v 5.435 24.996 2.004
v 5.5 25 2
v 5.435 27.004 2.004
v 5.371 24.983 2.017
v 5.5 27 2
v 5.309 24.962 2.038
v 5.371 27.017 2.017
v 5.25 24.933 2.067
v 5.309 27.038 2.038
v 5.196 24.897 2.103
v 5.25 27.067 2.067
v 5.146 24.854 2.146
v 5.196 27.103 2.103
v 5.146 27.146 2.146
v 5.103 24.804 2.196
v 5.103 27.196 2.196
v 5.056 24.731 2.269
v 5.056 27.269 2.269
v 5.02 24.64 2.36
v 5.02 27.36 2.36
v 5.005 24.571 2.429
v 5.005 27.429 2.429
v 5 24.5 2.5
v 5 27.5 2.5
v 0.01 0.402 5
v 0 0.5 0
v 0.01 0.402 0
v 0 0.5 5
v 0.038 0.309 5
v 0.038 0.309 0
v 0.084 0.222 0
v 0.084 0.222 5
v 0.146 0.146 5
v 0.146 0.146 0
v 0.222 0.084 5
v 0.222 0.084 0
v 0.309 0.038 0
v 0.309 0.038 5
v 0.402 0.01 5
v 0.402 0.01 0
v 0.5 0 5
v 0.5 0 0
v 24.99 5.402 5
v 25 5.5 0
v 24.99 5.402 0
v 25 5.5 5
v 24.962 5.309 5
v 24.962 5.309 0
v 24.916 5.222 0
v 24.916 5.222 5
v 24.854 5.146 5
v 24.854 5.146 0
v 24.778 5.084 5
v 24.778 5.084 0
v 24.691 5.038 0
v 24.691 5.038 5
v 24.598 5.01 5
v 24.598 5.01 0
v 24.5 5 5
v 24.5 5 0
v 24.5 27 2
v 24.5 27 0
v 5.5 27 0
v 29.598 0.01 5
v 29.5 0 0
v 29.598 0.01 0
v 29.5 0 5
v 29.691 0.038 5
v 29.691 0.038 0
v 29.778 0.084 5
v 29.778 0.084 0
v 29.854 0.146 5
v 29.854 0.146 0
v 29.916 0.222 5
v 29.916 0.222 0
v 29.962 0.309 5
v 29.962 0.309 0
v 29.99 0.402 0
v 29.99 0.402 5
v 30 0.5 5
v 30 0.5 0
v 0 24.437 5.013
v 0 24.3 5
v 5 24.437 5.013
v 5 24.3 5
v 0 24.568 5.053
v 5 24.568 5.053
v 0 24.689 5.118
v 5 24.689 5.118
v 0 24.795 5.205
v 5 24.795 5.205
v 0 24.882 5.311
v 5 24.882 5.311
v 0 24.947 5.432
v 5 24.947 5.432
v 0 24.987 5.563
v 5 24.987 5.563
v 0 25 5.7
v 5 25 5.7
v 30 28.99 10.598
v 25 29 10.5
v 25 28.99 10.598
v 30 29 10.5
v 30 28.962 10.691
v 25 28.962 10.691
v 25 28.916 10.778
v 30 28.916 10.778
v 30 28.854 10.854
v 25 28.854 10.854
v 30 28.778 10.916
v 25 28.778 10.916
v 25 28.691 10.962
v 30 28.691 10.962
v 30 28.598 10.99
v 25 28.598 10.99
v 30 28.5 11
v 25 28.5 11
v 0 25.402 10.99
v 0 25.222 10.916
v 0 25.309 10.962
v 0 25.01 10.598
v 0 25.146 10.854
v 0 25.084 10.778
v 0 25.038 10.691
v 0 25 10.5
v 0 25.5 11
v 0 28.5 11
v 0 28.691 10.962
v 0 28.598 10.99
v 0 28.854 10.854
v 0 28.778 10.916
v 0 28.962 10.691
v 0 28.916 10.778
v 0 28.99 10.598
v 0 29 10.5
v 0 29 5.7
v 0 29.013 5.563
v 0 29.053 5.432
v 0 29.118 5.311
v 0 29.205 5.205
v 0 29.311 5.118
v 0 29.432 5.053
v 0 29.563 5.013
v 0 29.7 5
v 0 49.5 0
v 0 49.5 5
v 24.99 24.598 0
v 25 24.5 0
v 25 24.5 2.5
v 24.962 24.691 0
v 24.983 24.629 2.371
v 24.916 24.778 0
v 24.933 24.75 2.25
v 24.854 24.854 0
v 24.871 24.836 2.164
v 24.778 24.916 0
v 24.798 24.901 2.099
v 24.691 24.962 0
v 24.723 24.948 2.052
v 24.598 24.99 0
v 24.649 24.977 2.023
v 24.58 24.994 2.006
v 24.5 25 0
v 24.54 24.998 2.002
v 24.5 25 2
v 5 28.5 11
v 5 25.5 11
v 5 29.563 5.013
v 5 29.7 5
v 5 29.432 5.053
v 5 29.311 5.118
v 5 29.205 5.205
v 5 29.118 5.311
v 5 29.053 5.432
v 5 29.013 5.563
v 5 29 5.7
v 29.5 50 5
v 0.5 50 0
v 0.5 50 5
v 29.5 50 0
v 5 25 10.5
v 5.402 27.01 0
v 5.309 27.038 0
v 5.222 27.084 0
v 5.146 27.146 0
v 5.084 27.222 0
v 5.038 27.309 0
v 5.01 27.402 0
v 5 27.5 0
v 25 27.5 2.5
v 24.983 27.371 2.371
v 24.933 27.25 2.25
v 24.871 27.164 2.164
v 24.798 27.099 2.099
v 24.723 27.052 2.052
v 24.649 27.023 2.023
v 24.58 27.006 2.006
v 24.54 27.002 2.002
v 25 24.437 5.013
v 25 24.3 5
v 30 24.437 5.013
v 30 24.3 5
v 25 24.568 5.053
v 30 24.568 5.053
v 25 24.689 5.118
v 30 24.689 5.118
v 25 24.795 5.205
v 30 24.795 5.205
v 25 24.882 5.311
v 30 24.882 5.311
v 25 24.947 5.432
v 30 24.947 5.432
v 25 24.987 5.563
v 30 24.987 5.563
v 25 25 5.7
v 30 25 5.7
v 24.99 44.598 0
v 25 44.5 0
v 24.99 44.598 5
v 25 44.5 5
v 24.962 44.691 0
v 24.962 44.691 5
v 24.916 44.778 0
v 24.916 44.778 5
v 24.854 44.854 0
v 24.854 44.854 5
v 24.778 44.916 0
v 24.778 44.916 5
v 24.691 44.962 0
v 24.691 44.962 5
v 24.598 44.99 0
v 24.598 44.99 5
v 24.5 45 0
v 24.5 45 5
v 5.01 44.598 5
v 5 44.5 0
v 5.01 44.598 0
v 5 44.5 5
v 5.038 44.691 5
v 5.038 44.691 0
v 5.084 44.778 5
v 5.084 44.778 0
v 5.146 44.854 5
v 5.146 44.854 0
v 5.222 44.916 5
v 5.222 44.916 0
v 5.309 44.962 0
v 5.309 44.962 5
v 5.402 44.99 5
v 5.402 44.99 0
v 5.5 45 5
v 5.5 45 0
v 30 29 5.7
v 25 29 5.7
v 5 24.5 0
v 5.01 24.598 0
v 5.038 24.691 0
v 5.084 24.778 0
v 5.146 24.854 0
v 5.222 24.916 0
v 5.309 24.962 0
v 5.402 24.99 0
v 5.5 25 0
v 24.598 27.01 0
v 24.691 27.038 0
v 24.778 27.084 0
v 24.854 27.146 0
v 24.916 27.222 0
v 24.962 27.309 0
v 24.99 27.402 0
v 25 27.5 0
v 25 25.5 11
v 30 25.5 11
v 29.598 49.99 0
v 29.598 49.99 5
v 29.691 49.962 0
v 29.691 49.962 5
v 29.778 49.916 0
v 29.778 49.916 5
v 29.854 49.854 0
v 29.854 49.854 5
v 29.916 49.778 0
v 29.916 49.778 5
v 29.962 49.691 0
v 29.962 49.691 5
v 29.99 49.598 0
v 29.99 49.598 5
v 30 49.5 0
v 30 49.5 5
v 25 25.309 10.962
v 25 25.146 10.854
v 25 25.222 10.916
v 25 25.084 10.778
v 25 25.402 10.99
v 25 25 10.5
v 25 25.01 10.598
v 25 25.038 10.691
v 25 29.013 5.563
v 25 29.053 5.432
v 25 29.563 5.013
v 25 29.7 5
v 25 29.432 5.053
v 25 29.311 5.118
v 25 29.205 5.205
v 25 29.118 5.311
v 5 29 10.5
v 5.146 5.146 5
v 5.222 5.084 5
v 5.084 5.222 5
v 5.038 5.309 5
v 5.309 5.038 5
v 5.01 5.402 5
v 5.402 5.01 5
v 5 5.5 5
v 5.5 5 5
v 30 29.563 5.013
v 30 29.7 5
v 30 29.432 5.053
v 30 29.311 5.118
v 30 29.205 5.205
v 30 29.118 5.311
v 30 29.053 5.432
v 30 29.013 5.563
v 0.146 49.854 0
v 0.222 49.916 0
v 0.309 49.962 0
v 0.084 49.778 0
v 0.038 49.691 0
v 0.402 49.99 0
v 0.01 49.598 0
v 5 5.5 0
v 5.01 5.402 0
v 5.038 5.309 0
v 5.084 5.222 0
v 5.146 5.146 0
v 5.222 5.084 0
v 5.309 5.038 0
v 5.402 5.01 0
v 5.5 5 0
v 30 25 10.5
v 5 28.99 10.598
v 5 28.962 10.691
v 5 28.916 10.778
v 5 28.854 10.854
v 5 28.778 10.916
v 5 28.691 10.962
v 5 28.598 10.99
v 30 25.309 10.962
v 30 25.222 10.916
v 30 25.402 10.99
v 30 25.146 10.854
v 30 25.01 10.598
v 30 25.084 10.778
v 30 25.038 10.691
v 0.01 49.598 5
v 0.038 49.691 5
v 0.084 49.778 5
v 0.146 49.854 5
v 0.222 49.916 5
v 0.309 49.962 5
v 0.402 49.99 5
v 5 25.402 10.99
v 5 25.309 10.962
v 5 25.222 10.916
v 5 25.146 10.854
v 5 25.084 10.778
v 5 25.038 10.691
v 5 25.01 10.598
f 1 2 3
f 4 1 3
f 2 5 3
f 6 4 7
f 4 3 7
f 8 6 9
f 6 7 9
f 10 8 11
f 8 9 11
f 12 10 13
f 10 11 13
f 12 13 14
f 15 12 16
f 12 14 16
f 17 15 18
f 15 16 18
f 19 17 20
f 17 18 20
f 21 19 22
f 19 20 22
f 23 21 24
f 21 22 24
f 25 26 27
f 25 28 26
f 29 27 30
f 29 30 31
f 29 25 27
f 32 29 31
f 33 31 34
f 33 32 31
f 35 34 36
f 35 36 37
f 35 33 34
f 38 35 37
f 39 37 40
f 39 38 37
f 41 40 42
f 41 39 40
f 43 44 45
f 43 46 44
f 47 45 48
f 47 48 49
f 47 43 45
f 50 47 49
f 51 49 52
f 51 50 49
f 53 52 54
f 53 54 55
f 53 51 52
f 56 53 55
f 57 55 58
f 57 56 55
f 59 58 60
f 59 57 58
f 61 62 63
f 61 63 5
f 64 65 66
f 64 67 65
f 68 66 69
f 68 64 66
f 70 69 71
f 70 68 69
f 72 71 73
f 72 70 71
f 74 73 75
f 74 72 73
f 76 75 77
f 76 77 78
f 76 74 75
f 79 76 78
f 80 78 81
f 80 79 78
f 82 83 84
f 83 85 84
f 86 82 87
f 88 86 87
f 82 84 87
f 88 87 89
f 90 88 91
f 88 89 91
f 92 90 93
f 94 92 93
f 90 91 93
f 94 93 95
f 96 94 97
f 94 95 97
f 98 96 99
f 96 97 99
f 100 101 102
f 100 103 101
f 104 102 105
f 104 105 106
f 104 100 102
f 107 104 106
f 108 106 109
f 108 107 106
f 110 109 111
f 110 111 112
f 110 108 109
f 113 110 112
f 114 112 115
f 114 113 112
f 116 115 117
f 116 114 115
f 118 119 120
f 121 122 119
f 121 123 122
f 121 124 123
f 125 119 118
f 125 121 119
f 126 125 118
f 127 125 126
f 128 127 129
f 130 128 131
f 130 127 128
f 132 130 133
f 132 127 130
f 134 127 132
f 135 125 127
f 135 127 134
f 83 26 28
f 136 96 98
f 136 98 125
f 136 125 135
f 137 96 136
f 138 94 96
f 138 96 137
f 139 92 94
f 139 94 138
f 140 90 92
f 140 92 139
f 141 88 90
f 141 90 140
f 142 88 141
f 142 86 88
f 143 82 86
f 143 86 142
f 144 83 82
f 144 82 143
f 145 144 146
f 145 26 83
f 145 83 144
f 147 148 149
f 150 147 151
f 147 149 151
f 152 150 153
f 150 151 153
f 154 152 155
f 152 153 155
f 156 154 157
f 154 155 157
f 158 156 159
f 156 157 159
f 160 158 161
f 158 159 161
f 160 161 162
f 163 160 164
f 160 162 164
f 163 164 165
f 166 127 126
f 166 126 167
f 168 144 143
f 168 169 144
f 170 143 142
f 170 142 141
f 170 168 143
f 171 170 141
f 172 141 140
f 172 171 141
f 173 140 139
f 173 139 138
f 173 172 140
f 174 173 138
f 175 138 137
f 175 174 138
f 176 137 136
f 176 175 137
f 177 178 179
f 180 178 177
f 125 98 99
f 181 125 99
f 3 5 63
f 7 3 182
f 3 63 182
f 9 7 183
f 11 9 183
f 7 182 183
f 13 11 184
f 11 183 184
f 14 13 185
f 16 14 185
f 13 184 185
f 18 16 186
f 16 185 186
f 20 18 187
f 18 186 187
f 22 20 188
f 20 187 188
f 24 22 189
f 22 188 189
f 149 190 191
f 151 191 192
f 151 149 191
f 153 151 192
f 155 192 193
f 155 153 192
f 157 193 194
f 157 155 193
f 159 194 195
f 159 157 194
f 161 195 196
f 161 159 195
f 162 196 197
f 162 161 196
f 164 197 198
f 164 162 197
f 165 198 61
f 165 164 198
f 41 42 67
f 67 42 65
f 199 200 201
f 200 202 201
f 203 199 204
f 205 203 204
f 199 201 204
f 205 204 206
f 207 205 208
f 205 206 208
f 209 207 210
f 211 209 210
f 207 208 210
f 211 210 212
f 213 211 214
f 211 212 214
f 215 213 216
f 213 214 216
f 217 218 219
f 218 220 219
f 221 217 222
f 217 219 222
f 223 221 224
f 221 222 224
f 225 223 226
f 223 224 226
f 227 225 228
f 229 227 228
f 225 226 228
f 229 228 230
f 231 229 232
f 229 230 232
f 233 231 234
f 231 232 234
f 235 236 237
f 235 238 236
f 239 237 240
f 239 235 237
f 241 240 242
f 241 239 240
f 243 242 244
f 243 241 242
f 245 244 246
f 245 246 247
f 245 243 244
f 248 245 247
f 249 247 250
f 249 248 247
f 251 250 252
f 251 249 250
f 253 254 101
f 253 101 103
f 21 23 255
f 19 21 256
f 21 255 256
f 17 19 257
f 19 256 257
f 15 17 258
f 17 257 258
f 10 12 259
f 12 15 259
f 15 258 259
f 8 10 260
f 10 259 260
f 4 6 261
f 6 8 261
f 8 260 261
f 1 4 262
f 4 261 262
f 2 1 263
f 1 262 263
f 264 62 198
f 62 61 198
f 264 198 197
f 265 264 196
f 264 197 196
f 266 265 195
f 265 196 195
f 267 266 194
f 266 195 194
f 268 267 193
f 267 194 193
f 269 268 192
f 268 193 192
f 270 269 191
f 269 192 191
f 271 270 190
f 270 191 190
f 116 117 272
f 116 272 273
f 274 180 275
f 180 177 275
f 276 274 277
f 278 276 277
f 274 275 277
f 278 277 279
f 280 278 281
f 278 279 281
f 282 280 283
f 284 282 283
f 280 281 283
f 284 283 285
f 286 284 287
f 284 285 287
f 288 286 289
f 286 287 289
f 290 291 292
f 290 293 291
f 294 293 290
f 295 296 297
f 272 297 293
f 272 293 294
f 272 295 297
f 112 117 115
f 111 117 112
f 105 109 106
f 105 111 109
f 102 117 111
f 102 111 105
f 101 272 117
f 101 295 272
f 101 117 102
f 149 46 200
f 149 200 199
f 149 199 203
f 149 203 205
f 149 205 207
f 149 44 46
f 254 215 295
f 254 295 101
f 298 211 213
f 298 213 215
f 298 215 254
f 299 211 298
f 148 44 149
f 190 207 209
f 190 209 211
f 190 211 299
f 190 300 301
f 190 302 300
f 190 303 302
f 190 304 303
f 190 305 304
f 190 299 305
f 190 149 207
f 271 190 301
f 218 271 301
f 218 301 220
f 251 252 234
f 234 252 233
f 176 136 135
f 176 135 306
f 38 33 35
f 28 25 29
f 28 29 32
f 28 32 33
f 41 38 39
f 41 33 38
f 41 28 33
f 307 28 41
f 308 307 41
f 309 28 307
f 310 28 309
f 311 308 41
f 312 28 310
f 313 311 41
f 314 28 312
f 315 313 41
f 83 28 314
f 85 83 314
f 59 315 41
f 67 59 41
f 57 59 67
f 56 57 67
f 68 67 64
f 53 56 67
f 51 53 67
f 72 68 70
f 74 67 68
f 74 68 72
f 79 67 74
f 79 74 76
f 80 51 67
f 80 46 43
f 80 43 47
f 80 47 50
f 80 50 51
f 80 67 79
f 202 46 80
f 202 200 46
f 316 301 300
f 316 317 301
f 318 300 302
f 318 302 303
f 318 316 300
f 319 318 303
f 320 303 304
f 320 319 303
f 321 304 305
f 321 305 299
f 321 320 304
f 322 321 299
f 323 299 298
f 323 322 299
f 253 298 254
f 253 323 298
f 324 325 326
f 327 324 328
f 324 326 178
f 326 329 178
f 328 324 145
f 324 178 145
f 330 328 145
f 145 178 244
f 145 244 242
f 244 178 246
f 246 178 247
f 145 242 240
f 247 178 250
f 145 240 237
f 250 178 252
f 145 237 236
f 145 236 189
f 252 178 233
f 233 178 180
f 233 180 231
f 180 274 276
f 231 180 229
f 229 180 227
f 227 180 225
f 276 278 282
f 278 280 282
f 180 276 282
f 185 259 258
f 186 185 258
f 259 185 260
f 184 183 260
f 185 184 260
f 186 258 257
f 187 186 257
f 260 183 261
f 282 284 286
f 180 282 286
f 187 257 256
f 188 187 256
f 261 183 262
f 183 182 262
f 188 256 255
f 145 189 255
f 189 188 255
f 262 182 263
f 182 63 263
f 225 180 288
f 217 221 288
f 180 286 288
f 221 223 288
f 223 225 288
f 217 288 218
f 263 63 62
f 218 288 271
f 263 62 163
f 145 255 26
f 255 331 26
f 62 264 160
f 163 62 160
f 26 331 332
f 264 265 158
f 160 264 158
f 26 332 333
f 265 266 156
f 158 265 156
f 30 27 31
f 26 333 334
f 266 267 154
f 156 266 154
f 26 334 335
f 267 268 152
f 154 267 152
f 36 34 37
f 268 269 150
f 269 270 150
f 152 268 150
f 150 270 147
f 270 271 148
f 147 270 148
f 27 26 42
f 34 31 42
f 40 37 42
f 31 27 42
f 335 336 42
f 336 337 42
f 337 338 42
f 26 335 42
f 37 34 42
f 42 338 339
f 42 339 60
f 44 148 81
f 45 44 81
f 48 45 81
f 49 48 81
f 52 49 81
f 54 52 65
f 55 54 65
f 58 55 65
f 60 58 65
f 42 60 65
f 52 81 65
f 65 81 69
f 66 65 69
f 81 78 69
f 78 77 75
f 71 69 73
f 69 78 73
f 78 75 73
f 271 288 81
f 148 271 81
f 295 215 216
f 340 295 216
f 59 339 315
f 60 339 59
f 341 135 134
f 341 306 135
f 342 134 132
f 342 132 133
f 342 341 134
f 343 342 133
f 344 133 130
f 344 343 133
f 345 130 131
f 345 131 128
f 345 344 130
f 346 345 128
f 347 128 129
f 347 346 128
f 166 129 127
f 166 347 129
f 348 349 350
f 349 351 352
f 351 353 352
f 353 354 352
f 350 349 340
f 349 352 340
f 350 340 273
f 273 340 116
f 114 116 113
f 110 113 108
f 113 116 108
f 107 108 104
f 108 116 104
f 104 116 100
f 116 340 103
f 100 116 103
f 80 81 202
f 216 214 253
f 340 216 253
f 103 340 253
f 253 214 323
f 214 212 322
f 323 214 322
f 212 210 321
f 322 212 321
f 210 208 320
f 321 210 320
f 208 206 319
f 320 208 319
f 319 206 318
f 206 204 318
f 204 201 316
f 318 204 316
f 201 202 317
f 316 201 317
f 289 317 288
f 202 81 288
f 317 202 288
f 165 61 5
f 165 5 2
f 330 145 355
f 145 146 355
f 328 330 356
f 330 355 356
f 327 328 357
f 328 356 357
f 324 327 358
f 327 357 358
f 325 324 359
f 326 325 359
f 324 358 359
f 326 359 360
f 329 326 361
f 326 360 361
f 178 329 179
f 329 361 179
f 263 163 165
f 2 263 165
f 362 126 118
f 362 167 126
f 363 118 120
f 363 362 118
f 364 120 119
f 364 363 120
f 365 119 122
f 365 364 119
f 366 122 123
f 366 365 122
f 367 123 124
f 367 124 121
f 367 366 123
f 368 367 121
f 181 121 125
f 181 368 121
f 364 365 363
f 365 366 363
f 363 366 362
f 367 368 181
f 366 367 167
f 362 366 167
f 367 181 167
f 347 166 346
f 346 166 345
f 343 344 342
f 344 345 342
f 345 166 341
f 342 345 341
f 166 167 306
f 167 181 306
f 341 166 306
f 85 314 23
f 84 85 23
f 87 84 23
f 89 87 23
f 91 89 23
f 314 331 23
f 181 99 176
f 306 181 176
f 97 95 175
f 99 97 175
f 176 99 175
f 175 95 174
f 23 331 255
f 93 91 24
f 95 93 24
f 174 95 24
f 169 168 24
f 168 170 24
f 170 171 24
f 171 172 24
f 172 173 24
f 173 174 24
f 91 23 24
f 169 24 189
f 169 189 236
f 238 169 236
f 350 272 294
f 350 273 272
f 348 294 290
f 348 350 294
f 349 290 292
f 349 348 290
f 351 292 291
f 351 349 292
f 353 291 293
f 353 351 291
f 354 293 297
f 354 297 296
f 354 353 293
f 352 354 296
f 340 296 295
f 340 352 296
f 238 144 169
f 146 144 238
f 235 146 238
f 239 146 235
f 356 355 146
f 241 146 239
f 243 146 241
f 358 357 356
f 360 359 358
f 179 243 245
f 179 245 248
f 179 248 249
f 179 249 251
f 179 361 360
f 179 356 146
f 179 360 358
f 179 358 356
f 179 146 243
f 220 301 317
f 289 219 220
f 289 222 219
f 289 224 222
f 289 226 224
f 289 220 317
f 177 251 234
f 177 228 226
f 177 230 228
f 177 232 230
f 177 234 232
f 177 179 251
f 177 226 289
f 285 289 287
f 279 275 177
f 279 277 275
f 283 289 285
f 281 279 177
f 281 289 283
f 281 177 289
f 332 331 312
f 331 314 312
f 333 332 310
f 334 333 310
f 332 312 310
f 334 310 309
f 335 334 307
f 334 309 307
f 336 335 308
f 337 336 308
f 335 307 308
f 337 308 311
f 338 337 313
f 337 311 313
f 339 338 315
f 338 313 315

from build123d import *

# Parameters (mm, degrees)
F0_W     = 30
F0_H     = 50
F0_W_2   = 20
F0_H_2   = 40
F1_DEPTH = 5
F2_W     = 5
F2_H     = 4
F3_DEPTH = 6
F4_W     = 2
F4_H     = 2
F5_DEPTH = 20.11
F6_R     = 0.5
F7_R     = 0.7


with BuildPart() as f1:
    # F0 (on Top) → F1 (new body)
    with BuildSketch(Plane.XY):
        with Locations((15, 25)):
            Rectangle(F0_W, F0_H)
        with Locations((15, 25)):
            Rectangle(F0_W_2, F0_H_2, mode=Mode.SUBTRACT)
    extrude(amount=F1_DEPTH)

    # F2 (on face) → F3 (join)
    with BuildSketch(Plane.XY.offset(5)):
        with Locations((2.5, 27)):
            Rectangle(F2_W, F2_H)
        with Locations((27.5, 27)):
            Rectangle(F2_W, F2_H)
    extrude(amount=F3_DEPTH)

    # F4 (on face) → F5 (join)
    with BuildSketch(Plane(origin=(25, 0, 0), x_dir=(0, -1, 0), z_dir=(-1, 0, 0))):
        with Locations((-26, 1)):
            Rectangle(F4_W, F4_H)
    extrude(amount=F5_DEPTH)

    # F6
    f6_edges = [f1.edges().sort_by_distance(p)[0] for p in [
        (27.5, 29, 11),
        (27.5, 25, 11),
        (2.5, 25, 11),
        (2.5, 29, 11),
        (30, 0, 2.5),
        (25, 5, 2.5),
        (30, 50, 2.5),
        (0, 50, 2.5),
        (5, 45, 2.5),
        (5, 5, 2.5),
        (5, 27, 1),
        (5, 26, 2),
        (5, 25, 1),
        (25, 25, 1),
        (25, 26, 2),
        (25, 45, 2.5),
        (25, 27, 1),
        (0, 0, 2.5),
    ]]
    fillet(f6_edges, radius=F6_R)

    # F7
    f7_edges = [f1.edges().sort_by_distance(p)[0] for p in [
        (2.5, 25, 5),
        (27.5, 25, 5),
        (27.5, 29, 5),
        (2.5, 29, 5),
    ]]
    fillet(f7_edges, radius=F7_R)


solid = f1.part
